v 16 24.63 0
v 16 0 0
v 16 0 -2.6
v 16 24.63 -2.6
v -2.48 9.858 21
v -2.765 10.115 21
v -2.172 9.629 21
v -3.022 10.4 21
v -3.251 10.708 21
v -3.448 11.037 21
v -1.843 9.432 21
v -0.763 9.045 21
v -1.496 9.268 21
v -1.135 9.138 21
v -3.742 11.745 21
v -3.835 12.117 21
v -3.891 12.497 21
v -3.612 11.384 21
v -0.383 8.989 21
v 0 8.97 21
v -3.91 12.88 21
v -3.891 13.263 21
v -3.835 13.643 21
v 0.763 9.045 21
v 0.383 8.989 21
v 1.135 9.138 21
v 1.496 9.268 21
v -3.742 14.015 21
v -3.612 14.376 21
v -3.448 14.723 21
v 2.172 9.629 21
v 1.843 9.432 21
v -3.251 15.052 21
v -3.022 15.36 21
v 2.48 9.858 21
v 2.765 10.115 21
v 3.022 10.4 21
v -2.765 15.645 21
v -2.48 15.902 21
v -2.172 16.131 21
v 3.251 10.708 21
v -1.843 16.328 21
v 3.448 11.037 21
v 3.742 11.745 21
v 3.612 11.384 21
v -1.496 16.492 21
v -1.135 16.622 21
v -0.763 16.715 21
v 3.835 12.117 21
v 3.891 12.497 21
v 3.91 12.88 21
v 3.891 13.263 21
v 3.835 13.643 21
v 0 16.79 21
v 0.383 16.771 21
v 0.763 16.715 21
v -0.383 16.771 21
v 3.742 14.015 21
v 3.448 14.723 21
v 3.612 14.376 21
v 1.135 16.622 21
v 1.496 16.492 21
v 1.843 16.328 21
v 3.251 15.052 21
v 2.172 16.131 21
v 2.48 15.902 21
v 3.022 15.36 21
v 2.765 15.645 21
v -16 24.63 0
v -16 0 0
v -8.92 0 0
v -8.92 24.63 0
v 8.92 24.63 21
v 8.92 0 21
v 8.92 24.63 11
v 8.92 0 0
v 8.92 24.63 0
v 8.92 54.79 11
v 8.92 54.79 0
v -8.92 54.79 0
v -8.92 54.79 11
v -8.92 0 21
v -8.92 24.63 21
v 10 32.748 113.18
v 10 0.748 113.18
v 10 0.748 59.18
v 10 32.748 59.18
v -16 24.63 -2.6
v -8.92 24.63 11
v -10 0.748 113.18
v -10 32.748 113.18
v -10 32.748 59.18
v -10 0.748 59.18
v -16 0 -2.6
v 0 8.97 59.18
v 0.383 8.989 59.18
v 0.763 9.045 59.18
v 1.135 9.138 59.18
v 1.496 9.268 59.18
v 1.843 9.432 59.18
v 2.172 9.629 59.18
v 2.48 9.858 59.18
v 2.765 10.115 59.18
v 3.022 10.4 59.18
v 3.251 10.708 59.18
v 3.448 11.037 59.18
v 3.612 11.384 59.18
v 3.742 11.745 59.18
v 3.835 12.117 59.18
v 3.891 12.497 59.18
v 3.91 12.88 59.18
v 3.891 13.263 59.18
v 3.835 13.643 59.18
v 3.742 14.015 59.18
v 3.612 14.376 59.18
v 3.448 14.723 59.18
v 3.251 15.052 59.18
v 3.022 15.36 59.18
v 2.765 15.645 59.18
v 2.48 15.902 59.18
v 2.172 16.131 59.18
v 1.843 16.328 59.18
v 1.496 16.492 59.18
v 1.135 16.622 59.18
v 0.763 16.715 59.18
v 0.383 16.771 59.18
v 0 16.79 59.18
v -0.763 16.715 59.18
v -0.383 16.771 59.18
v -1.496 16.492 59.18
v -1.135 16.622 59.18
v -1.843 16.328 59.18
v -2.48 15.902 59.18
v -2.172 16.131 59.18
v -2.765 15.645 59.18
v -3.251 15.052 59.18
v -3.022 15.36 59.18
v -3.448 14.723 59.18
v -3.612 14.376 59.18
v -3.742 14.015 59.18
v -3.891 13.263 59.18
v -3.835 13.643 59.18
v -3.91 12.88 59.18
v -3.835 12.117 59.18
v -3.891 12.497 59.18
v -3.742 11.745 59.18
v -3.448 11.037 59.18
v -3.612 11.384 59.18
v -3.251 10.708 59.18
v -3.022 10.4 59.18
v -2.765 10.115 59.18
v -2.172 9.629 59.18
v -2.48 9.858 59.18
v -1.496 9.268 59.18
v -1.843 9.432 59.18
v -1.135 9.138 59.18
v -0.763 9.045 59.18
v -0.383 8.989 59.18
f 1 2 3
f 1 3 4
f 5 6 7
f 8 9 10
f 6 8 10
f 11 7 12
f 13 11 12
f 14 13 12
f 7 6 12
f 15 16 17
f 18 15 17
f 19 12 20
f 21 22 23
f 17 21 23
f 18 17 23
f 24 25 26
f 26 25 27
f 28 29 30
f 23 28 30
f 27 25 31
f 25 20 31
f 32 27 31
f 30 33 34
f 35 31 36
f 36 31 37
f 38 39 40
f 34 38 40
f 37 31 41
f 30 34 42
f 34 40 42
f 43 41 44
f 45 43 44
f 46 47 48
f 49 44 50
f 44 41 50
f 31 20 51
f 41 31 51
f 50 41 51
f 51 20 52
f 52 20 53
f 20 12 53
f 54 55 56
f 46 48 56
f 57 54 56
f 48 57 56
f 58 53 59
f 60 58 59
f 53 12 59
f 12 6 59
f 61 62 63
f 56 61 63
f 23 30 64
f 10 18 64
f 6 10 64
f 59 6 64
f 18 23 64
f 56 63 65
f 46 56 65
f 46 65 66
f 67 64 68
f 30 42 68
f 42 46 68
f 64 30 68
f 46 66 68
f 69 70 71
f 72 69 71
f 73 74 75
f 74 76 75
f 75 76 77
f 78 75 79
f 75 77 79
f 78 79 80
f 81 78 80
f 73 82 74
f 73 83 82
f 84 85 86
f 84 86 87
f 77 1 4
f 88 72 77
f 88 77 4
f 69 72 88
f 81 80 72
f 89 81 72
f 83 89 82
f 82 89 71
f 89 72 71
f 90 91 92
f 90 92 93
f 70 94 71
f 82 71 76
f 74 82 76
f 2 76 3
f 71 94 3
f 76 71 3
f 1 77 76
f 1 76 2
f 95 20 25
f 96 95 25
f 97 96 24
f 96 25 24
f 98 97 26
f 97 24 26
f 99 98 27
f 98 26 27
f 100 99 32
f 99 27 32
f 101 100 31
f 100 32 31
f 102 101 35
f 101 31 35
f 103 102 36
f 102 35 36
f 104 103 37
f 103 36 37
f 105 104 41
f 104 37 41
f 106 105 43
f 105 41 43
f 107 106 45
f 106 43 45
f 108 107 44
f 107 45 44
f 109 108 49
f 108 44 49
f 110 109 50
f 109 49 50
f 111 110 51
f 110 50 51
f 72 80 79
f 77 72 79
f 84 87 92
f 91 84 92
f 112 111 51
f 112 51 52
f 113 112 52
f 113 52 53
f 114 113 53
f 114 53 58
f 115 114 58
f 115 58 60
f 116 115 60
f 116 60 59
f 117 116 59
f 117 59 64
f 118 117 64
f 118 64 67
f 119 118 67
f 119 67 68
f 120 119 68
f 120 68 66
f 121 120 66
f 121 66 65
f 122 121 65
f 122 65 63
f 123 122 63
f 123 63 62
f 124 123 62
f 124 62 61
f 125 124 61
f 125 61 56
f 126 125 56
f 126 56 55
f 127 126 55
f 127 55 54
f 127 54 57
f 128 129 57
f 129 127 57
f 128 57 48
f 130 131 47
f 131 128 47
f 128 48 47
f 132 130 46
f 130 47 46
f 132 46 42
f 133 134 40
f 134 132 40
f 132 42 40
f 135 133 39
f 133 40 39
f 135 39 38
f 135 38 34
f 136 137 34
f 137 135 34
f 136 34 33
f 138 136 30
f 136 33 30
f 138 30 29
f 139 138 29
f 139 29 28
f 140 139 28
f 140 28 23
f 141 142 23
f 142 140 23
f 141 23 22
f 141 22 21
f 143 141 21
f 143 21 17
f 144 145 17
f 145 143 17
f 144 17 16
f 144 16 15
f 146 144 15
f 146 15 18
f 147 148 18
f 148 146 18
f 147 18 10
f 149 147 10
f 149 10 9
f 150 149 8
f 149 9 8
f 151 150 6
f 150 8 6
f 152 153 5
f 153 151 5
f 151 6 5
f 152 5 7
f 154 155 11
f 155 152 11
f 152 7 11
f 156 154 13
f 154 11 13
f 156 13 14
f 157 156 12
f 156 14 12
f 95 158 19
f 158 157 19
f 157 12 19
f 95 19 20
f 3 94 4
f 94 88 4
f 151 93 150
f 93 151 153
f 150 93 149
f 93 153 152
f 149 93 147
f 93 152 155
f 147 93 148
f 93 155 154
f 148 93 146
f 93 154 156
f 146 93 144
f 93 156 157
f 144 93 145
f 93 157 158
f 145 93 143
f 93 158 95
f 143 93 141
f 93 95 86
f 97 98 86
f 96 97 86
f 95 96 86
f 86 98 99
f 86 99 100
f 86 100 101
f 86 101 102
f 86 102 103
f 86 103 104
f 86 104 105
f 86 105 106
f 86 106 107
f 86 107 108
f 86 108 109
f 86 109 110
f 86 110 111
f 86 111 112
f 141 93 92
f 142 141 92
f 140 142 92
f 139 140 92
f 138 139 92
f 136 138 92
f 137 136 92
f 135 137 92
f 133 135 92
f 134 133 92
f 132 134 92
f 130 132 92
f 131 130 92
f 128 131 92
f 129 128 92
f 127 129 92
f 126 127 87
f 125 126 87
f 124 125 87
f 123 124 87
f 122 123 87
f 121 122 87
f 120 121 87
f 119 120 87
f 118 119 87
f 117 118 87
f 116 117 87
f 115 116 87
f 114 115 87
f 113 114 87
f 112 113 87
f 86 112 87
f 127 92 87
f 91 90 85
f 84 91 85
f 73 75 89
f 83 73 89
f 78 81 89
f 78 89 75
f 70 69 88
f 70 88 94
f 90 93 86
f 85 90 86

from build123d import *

# Parameters (mm, degrees)
F1_DEPTH  = 2.6
F3_DEPTH  = 11
F6_DEPTH  = 10
F9_DEPTH  = 59.18
F12_DEPTH = 54


with BuildPart() as f1:
    # F0 (on Top) → F1 (new body)
    with BuildSketch(Plane.XY):
        Polygon((-16, 0), (0, 0), (16, 0), (16, 24.63), (0, 24.63), (-16, 24.63), align=None)
    extrude(amount=-F1_DEPTH)

    # F2 (on Top) → F3 (join)
    with BuildSketch(Plane.XY):
        Polygon((-8.92, 0), (0, 0), (8.92, 0), (8.92, 54.79), (-8.92, 54.79), align=None)
    extrude(amount=F3_DEPTH)

    # F5 (on offset) → F6 (join)
    with BuildSketch(Plane.XY.offset(11)):
        Polygon((-8.92, 0), (0, 0), (8.92, 0), (8.92, 24.63), (-8.92, 24.63), align=None)
    extrude(amount=F6_DEPTH)


with BuildPart() as f9:
    # F8 (on offset) → F9 (new body)
    with BuildSketch(Plane.XY.offset(21)):
        with BuildLine():
            ThreePointArc((0, 8.97), (2.764788, 10.115212), (3.91, 12.88))
            ThreePointArc((3.91, 12.88), (-2.764788, 15.644788), (0, 8.97))
        make_face()
    extrude(amount=F9_DEPTH)

    # F11 (on offset) → F12 (join)
    with BuildSketch(Plane.XY.offset(59.18)):
        Polygon((-10, 0.748179), (0, 0.748179), (10, 0.748179), (10, 32.748179), (0, 32.748179), (-10, 32.748179), align=None)
    extrude(amount=F12_DEPTH)


solid = Compound([f1.part, f9.part])
